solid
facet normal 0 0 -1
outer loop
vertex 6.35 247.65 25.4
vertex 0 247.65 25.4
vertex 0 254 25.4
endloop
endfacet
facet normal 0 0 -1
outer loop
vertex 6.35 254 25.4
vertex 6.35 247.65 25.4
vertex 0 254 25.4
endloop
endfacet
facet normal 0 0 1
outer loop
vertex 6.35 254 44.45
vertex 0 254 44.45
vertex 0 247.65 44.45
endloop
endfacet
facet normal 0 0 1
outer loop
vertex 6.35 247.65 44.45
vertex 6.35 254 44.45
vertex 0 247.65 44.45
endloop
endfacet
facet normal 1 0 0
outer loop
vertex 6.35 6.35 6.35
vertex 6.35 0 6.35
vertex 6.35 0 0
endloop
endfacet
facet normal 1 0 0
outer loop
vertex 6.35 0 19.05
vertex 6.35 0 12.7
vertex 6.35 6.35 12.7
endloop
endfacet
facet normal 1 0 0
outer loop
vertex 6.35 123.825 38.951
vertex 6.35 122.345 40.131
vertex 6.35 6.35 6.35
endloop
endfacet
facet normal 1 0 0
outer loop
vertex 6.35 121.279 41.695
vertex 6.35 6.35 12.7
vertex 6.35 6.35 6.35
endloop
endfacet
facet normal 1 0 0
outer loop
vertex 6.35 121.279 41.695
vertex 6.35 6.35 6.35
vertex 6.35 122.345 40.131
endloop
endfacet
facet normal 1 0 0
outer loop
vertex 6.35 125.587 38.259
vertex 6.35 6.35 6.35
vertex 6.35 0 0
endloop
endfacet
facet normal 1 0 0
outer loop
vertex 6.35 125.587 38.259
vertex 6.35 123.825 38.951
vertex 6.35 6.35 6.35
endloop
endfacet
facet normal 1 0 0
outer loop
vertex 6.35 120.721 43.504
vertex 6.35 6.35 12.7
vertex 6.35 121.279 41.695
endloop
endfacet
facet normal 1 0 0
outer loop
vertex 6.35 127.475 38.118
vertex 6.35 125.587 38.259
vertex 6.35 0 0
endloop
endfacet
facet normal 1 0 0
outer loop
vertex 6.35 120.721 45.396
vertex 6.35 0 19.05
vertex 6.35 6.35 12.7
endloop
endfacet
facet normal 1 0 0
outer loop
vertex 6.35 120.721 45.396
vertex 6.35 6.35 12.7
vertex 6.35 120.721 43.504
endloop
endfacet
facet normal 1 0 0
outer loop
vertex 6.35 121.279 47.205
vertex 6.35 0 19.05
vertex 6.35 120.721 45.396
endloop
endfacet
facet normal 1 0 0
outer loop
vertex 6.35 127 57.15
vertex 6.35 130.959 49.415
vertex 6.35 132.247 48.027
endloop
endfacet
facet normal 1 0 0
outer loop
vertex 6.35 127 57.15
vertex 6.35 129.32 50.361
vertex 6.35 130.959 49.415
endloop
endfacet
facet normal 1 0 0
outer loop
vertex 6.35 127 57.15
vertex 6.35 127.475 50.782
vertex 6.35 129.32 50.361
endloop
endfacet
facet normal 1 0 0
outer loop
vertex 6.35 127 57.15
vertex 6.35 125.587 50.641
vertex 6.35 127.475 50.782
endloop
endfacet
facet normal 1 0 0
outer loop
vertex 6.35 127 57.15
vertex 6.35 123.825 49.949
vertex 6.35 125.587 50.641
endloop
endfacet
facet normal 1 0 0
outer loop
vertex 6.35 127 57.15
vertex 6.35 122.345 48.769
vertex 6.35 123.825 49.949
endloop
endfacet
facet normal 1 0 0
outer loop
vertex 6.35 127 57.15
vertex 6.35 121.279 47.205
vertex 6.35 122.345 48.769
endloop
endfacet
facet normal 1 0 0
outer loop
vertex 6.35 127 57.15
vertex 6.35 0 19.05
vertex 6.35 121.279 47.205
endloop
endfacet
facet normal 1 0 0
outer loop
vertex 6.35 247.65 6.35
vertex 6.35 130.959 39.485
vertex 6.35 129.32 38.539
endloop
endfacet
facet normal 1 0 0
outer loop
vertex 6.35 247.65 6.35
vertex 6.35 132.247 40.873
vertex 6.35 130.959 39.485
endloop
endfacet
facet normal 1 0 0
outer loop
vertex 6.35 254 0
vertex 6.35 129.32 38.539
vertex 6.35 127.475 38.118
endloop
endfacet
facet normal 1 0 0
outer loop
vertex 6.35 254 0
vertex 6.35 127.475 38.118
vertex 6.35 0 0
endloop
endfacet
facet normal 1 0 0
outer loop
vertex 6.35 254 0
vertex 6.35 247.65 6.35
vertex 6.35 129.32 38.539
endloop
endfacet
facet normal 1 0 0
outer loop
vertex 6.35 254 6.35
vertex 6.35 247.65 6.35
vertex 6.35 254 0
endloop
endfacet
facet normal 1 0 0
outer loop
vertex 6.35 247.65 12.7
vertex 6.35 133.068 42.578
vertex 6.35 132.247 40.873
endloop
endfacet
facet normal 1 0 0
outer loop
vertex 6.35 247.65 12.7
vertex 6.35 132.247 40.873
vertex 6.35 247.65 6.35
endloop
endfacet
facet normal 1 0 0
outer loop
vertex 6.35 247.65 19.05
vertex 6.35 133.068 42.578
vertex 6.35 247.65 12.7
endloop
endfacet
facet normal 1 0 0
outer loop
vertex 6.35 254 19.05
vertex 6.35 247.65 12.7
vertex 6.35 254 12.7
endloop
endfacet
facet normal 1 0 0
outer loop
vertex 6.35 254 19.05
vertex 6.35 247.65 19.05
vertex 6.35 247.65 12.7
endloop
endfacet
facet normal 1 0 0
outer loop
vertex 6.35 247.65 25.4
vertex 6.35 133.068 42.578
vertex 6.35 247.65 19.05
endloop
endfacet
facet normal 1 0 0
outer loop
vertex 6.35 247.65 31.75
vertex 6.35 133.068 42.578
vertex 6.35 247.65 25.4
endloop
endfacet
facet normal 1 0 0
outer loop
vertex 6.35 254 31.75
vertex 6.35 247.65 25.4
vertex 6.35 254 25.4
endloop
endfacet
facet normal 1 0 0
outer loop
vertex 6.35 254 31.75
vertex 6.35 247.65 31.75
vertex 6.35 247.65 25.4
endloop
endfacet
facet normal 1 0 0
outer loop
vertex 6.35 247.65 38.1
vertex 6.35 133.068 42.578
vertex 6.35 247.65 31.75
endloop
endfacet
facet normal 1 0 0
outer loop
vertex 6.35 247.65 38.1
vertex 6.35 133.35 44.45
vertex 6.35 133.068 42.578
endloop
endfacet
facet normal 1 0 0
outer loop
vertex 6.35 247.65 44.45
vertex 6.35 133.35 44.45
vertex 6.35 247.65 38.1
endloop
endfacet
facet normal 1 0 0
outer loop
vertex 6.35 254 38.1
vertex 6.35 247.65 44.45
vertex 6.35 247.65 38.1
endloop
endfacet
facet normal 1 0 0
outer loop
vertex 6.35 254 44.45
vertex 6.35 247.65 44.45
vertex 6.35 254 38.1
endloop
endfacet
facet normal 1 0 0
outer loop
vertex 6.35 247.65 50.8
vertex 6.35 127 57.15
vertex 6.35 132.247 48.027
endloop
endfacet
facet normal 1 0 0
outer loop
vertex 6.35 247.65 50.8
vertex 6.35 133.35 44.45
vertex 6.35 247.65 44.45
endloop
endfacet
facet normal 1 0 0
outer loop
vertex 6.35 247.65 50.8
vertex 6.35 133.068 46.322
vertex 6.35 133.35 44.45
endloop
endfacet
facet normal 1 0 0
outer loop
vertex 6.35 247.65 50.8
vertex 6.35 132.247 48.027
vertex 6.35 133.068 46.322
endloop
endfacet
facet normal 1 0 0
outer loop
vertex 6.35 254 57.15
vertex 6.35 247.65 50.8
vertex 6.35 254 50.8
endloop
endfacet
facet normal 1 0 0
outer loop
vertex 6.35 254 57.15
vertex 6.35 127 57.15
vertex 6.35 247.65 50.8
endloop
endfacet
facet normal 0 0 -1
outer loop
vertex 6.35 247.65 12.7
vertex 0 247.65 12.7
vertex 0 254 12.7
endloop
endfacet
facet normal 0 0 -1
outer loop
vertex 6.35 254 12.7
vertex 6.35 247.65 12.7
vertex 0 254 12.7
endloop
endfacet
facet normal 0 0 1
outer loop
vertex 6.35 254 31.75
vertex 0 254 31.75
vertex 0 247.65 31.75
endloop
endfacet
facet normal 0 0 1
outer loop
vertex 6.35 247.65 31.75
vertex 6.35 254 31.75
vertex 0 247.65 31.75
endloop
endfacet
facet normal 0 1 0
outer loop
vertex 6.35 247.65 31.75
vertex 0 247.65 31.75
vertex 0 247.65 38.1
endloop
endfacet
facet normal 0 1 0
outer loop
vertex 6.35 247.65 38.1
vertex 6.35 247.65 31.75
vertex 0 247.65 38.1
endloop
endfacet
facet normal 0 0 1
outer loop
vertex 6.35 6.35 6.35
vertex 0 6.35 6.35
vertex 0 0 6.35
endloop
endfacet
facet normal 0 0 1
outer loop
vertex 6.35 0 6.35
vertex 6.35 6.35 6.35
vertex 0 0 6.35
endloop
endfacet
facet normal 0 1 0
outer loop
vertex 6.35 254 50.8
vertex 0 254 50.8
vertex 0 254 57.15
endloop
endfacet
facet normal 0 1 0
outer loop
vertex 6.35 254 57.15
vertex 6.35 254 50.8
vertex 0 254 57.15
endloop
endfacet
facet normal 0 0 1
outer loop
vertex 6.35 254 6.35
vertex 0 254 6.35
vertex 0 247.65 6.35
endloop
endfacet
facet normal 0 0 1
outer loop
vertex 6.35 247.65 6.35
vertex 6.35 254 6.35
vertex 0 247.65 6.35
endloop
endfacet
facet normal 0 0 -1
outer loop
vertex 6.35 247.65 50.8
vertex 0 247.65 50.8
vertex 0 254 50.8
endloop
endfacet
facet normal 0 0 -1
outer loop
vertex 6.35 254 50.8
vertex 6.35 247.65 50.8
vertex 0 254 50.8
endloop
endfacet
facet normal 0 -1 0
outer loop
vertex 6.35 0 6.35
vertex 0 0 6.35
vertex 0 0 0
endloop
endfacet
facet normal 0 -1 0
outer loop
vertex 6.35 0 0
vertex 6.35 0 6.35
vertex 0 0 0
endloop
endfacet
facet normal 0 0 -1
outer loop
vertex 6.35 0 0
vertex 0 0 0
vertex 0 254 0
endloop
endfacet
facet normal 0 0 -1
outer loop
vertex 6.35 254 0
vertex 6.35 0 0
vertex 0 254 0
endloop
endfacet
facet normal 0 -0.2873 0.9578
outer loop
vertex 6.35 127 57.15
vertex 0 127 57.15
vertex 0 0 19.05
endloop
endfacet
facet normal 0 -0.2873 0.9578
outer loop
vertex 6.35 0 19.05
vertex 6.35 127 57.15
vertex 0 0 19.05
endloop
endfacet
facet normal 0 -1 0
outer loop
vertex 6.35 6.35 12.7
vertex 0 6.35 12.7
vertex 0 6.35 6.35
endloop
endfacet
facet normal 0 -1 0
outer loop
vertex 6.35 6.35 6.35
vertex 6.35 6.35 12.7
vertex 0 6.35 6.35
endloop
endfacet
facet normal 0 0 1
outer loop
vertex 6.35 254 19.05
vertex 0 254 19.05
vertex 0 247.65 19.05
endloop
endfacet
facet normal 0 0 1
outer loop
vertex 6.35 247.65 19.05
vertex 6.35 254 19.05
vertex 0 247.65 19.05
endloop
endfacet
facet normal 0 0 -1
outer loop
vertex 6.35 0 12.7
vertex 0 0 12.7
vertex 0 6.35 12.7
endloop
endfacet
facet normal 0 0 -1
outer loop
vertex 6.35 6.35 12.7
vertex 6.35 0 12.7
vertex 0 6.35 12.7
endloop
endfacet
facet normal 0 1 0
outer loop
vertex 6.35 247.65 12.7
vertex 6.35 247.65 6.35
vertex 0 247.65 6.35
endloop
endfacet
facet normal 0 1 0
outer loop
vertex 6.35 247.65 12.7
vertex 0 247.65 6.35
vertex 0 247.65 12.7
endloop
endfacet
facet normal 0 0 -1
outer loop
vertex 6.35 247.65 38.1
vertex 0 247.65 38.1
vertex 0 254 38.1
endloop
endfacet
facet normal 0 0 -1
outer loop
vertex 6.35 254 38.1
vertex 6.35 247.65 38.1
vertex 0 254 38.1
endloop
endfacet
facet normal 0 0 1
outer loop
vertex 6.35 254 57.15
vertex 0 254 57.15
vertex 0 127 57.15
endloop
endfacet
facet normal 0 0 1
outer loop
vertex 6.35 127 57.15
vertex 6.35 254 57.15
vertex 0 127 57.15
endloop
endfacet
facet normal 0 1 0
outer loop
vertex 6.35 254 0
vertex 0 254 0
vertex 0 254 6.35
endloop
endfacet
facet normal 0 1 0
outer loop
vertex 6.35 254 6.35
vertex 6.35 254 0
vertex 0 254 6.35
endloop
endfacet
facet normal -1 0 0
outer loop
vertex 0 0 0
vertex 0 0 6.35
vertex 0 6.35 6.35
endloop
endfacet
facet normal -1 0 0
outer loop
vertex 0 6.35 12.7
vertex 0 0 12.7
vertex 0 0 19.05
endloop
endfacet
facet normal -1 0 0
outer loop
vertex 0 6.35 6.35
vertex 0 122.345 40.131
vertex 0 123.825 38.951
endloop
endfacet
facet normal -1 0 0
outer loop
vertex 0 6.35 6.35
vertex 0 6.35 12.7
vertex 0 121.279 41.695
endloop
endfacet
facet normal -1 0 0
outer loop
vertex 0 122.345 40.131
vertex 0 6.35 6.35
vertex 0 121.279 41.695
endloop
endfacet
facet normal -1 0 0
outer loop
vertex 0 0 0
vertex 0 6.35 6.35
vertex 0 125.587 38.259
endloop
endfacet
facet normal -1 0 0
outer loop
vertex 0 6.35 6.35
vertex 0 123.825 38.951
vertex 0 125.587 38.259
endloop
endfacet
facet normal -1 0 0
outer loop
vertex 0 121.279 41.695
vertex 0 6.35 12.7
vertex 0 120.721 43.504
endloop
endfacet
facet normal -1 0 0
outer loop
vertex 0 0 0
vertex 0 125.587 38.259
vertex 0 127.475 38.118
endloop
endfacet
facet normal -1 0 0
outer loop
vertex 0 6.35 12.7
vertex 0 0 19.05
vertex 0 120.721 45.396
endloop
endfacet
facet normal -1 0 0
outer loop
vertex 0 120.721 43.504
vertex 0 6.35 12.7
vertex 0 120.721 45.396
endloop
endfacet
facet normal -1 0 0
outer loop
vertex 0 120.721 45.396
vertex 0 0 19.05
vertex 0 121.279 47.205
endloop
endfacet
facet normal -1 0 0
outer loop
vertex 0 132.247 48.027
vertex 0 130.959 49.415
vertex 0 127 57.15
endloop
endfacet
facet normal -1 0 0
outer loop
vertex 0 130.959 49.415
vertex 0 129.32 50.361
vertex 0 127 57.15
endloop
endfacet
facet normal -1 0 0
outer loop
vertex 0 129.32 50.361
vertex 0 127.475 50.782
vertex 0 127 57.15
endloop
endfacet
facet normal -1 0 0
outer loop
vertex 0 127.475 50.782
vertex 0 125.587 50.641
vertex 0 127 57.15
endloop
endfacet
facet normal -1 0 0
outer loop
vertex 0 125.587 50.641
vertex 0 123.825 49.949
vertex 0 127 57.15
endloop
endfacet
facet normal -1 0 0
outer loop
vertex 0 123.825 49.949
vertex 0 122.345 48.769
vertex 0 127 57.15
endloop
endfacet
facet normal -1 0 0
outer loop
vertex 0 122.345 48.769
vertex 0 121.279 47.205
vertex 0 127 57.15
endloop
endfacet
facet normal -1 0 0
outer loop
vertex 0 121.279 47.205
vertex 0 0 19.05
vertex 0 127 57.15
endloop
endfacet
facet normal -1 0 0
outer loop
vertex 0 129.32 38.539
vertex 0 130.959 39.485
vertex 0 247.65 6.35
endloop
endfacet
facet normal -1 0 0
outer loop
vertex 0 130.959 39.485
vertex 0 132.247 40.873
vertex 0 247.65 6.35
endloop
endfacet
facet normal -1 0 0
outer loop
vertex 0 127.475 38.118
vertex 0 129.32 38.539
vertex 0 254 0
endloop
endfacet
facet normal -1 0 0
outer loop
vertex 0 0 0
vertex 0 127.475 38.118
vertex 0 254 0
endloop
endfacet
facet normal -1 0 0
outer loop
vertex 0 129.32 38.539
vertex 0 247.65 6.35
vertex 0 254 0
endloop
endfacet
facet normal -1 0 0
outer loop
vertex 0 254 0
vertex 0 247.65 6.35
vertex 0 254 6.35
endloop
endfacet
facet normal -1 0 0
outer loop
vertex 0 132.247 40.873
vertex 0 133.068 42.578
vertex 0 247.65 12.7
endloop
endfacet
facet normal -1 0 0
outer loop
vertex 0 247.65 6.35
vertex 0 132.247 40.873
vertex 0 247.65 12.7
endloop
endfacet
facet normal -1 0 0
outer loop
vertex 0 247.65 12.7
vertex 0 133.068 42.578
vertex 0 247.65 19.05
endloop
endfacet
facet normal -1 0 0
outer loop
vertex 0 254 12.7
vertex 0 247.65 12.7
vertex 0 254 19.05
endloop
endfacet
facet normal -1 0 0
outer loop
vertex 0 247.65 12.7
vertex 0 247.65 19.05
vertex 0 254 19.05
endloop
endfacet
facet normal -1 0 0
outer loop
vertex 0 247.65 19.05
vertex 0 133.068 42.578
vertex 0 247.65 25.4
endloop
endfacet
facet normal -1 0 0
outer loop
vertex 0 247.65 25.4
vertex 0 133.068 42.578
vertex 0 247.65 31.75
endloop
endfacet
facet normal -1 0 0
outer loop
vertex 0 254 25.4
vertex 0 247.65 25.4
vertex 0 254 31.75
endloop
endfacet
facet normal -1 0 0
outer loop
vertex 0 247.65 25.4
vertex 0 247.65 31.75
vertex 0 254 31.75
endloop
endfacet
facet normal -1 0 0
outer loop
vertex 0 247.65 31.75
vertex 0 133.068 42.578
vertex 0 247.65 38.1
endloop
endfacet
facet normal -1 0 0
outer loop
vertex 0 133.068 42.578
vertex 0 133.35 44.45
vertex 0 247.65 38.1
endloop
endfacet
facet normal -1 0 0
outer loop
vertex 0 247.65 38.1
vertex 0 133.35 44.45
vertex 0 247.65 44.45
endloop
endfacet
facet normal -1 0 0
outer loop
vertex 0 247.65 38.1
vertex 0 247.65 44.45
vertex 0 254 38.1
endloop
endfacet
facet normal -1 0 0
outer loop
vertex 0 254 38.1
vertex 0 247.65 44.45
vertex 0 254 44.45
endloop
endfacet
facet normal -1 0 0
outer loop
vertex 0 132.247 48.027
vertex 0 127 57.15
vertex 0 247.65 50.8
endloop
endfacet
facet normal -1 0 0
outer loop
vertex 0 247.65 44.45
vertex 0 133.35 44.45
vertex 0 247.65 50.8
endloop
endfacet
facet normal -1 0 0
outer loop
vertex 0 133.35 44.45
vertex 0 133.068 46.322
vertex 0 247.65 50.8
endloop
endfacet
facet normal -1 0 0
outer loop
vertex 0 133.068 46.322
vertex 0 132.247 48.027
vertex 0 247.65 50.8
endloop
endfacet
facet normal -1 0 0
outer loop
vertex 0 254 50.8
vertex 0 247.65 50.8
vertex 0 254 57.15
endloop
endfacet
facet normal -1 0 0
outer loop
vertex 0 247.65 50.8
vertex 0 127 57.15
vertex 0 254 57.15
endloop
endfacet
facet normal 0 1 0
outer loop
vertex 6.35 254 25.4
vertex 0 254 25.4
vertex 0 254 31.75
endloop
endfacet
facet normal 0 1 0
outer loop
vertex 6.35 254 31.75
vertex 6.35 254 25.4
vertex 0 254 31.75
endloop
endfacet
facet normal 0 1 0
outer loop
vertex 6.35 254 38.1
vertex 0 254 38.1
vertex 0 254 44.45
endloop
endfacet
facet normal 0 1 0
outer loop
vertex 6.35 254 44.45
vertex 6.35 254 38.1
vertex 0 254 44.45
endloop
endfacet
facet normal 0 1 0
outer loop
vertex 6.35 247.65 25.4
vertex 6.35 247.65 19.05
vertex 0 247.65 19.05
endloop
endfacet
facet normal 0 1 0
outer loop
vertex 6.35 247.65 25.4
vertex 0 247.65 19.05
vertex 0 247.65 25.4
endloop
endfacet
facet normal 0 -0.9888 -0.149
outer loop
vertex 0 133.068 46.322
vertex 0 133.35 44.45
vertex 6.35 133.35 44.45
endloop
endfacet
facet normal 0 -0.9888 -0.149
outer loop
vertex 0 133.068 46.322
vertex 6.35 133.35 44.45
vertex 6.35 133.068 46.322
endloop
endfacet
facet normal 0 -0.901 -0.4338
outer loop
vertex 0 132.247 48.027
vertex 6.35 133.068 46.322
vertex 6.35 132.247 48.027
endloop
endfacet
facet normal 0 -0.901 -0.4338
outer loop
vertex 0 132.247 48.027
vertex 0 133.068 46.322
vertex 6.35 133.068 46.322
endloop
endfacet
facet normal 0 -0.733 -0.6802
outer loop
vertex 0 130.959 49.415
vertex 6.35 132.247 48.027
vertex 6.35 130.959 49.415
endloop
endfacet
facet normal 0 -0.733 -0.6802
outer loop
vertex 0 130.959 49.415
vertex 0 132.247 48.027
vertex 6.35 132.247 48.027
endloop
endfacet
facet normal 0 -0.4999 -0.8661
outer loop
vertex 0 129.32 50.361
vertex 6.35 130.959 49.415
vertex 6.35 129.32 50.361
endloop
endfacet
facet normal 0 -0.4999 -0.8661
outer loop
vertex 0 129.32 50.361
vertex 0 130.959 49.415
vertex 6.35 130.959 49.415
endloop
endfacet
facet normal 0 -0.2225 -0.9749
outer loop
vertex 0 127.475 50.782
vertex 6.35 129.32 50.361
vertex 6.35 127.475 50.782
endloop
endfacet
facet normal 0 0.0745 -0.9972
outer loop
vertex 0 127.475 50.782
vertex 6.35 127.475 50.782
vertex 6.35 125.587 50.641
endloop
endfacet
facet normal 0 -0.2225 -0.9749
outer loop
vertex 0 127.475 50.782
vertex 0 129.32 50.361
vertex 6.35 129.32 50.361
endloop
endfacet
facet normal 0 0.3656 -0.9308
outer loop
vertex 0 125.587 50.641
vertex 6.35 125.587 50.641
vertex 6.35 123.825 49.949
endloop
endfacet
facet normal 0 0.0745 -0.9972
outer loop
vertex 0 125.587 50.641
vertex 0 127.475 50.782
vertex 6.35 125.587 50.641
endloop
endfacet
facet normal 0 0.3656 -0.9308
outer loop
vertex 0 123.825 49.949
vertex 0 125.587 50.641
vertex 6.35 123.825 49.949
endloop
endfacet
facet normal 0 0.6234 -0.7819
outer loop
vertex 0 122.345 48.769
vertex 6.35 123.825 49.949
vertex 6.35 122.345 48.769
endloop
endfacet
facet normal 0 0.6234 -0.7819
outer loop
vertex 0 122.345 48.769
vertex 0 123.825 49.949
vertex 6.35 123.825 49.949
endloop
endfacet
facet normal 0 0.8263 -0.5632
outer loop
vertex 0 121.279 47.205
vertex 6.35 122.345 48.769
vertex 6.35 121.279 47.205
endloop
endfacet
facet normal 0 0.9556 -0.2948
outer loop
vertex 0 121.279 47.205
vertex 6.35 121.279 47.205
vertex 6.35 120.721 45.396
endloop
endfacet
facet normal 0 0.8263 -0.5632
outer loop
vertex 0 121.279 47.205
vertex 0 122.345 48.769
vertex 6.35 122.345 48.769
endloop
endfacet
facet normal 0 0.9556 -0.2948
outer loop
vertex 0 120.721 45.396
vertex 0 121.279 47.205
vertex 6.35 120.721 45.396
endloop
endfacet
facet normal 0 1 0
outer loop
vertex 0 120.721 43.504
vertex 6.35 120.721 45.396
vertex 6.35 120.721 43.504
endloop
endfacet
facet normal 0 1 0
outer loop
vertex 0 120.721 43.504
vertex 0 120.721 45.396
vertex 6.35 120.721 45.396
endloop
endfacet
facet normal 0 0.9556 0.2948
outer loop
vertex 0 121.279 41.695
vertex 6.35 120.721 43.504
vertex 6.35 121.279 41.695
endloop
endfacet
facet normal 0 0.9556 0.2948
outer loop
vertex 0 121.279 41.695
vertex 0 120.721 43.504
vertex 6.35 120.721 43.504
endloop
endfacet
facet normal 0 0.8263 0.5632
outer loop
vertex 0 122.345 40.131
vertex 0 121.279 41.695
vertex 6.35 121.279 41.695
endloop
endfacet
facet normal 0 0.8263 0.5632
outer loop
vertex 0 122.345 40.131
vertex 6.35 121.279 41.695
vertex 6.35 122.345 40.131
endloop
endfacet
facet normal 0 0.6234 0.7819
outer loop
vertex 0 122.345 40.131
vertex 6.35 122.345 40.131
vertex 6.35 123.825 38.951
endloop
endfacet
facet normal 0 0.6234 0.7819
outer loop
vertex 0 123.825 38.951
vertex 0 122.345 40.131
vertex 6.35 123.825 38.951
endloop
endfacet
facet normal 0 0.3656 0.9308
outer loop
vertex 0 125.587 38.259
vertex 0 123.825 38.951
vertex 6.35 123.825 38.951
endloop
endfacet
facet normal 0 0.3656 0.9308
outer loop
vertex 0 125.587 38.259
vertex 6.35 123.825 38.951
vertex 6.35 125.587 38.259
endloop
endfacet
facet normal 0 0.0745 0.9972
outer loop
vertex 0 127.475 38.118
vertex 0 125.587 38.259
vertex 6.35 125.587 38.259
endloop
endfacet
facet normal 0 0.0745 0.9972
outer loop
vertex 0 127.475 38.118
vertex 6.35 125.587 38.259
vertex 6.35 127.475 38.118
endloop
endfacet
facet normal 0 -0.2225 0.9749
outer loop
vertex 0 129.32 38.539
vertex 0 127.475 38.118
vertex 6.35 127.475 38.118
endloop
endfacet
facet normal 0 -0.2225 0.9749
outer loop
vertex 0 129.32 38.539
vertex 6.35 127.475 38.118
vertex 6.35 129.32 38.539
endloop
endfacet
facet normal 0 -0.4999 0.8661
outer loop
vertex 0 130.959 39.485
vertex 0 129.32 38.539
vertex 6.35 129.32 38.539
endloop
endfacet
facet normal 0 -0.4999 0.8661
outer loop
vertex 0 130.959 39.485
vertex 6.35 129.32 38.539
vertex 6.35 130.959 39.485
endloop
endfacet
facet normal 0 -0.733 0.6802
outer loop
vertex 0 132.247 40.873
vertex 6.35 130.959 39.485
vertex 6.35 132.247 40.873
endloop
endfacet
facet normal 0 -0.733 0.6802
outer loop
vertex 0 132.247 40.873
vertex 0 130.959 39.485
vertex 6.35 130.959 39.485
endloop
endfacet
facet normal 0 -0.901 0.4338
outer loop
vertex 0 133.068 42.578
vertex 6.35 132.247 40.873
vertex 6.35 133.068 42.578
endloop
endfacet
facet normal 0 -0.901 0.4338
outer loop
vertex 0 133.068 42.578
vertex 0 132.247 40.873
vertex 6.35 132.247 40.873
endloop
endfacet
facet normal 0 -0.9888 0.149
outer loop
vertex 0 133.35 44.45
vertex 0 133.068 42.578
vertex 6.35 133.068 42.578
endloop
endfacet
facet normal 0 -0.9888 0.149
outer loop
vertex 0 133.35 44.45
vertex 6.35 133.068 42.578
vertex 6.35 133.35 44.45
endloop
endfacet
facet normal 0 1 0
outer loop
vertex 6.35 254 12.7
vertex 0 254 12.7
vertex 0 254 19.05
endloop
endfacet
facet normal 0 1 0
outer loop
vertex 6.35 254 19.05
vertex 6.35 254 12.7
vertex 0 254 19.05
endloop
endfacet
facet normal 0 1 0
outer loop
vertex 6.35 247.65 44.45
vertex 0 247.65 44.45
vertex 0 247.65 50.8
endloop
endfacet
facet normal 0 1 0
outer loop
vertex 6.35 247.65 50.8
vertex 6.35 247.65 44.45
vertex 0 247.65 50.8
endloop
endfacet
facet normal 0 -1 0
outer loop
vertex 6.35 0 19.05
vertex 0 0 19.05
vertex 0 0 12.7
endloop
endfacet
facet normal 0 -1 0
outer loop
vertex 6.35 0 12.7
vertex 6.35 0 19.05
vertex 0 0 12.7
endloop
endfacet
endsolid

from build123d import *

# Parameters (mm, degrees)
F0_R     = 6.35
F1_DEPTH = 6.35


with BuildPart() as f1:
    # F0 (on Right) → F1 (new body)
    with BuildSketch(Plane.YZ):
        Polygon((0, 6.35), (0, 0), (254, 0), (254, 6.35), (247.65, 6.35), (247.65, 12.7), (254, 12.7), (254, 19.05), (247.65, 19.05), (247.65, 25.4), (254, 25.4), (254, 31.75), (247.65, 31.75), (247.65, 38.1), (254, 38.1), (254, 44.45), (247.65, 44.45), (247.65, 50.8), (254, 50.8), (254, 57.15), (127, 57.15), (0, 19.05), (0, 12.7), (6.35, 12.7), (6.35, 6.35), align=None)
        with Locations((127, 44.45)):
            Circle(F0_R, mode=Mode.SUBTRACT)
    extrude(amount=F1_DEPTH)


solid = f1.part
